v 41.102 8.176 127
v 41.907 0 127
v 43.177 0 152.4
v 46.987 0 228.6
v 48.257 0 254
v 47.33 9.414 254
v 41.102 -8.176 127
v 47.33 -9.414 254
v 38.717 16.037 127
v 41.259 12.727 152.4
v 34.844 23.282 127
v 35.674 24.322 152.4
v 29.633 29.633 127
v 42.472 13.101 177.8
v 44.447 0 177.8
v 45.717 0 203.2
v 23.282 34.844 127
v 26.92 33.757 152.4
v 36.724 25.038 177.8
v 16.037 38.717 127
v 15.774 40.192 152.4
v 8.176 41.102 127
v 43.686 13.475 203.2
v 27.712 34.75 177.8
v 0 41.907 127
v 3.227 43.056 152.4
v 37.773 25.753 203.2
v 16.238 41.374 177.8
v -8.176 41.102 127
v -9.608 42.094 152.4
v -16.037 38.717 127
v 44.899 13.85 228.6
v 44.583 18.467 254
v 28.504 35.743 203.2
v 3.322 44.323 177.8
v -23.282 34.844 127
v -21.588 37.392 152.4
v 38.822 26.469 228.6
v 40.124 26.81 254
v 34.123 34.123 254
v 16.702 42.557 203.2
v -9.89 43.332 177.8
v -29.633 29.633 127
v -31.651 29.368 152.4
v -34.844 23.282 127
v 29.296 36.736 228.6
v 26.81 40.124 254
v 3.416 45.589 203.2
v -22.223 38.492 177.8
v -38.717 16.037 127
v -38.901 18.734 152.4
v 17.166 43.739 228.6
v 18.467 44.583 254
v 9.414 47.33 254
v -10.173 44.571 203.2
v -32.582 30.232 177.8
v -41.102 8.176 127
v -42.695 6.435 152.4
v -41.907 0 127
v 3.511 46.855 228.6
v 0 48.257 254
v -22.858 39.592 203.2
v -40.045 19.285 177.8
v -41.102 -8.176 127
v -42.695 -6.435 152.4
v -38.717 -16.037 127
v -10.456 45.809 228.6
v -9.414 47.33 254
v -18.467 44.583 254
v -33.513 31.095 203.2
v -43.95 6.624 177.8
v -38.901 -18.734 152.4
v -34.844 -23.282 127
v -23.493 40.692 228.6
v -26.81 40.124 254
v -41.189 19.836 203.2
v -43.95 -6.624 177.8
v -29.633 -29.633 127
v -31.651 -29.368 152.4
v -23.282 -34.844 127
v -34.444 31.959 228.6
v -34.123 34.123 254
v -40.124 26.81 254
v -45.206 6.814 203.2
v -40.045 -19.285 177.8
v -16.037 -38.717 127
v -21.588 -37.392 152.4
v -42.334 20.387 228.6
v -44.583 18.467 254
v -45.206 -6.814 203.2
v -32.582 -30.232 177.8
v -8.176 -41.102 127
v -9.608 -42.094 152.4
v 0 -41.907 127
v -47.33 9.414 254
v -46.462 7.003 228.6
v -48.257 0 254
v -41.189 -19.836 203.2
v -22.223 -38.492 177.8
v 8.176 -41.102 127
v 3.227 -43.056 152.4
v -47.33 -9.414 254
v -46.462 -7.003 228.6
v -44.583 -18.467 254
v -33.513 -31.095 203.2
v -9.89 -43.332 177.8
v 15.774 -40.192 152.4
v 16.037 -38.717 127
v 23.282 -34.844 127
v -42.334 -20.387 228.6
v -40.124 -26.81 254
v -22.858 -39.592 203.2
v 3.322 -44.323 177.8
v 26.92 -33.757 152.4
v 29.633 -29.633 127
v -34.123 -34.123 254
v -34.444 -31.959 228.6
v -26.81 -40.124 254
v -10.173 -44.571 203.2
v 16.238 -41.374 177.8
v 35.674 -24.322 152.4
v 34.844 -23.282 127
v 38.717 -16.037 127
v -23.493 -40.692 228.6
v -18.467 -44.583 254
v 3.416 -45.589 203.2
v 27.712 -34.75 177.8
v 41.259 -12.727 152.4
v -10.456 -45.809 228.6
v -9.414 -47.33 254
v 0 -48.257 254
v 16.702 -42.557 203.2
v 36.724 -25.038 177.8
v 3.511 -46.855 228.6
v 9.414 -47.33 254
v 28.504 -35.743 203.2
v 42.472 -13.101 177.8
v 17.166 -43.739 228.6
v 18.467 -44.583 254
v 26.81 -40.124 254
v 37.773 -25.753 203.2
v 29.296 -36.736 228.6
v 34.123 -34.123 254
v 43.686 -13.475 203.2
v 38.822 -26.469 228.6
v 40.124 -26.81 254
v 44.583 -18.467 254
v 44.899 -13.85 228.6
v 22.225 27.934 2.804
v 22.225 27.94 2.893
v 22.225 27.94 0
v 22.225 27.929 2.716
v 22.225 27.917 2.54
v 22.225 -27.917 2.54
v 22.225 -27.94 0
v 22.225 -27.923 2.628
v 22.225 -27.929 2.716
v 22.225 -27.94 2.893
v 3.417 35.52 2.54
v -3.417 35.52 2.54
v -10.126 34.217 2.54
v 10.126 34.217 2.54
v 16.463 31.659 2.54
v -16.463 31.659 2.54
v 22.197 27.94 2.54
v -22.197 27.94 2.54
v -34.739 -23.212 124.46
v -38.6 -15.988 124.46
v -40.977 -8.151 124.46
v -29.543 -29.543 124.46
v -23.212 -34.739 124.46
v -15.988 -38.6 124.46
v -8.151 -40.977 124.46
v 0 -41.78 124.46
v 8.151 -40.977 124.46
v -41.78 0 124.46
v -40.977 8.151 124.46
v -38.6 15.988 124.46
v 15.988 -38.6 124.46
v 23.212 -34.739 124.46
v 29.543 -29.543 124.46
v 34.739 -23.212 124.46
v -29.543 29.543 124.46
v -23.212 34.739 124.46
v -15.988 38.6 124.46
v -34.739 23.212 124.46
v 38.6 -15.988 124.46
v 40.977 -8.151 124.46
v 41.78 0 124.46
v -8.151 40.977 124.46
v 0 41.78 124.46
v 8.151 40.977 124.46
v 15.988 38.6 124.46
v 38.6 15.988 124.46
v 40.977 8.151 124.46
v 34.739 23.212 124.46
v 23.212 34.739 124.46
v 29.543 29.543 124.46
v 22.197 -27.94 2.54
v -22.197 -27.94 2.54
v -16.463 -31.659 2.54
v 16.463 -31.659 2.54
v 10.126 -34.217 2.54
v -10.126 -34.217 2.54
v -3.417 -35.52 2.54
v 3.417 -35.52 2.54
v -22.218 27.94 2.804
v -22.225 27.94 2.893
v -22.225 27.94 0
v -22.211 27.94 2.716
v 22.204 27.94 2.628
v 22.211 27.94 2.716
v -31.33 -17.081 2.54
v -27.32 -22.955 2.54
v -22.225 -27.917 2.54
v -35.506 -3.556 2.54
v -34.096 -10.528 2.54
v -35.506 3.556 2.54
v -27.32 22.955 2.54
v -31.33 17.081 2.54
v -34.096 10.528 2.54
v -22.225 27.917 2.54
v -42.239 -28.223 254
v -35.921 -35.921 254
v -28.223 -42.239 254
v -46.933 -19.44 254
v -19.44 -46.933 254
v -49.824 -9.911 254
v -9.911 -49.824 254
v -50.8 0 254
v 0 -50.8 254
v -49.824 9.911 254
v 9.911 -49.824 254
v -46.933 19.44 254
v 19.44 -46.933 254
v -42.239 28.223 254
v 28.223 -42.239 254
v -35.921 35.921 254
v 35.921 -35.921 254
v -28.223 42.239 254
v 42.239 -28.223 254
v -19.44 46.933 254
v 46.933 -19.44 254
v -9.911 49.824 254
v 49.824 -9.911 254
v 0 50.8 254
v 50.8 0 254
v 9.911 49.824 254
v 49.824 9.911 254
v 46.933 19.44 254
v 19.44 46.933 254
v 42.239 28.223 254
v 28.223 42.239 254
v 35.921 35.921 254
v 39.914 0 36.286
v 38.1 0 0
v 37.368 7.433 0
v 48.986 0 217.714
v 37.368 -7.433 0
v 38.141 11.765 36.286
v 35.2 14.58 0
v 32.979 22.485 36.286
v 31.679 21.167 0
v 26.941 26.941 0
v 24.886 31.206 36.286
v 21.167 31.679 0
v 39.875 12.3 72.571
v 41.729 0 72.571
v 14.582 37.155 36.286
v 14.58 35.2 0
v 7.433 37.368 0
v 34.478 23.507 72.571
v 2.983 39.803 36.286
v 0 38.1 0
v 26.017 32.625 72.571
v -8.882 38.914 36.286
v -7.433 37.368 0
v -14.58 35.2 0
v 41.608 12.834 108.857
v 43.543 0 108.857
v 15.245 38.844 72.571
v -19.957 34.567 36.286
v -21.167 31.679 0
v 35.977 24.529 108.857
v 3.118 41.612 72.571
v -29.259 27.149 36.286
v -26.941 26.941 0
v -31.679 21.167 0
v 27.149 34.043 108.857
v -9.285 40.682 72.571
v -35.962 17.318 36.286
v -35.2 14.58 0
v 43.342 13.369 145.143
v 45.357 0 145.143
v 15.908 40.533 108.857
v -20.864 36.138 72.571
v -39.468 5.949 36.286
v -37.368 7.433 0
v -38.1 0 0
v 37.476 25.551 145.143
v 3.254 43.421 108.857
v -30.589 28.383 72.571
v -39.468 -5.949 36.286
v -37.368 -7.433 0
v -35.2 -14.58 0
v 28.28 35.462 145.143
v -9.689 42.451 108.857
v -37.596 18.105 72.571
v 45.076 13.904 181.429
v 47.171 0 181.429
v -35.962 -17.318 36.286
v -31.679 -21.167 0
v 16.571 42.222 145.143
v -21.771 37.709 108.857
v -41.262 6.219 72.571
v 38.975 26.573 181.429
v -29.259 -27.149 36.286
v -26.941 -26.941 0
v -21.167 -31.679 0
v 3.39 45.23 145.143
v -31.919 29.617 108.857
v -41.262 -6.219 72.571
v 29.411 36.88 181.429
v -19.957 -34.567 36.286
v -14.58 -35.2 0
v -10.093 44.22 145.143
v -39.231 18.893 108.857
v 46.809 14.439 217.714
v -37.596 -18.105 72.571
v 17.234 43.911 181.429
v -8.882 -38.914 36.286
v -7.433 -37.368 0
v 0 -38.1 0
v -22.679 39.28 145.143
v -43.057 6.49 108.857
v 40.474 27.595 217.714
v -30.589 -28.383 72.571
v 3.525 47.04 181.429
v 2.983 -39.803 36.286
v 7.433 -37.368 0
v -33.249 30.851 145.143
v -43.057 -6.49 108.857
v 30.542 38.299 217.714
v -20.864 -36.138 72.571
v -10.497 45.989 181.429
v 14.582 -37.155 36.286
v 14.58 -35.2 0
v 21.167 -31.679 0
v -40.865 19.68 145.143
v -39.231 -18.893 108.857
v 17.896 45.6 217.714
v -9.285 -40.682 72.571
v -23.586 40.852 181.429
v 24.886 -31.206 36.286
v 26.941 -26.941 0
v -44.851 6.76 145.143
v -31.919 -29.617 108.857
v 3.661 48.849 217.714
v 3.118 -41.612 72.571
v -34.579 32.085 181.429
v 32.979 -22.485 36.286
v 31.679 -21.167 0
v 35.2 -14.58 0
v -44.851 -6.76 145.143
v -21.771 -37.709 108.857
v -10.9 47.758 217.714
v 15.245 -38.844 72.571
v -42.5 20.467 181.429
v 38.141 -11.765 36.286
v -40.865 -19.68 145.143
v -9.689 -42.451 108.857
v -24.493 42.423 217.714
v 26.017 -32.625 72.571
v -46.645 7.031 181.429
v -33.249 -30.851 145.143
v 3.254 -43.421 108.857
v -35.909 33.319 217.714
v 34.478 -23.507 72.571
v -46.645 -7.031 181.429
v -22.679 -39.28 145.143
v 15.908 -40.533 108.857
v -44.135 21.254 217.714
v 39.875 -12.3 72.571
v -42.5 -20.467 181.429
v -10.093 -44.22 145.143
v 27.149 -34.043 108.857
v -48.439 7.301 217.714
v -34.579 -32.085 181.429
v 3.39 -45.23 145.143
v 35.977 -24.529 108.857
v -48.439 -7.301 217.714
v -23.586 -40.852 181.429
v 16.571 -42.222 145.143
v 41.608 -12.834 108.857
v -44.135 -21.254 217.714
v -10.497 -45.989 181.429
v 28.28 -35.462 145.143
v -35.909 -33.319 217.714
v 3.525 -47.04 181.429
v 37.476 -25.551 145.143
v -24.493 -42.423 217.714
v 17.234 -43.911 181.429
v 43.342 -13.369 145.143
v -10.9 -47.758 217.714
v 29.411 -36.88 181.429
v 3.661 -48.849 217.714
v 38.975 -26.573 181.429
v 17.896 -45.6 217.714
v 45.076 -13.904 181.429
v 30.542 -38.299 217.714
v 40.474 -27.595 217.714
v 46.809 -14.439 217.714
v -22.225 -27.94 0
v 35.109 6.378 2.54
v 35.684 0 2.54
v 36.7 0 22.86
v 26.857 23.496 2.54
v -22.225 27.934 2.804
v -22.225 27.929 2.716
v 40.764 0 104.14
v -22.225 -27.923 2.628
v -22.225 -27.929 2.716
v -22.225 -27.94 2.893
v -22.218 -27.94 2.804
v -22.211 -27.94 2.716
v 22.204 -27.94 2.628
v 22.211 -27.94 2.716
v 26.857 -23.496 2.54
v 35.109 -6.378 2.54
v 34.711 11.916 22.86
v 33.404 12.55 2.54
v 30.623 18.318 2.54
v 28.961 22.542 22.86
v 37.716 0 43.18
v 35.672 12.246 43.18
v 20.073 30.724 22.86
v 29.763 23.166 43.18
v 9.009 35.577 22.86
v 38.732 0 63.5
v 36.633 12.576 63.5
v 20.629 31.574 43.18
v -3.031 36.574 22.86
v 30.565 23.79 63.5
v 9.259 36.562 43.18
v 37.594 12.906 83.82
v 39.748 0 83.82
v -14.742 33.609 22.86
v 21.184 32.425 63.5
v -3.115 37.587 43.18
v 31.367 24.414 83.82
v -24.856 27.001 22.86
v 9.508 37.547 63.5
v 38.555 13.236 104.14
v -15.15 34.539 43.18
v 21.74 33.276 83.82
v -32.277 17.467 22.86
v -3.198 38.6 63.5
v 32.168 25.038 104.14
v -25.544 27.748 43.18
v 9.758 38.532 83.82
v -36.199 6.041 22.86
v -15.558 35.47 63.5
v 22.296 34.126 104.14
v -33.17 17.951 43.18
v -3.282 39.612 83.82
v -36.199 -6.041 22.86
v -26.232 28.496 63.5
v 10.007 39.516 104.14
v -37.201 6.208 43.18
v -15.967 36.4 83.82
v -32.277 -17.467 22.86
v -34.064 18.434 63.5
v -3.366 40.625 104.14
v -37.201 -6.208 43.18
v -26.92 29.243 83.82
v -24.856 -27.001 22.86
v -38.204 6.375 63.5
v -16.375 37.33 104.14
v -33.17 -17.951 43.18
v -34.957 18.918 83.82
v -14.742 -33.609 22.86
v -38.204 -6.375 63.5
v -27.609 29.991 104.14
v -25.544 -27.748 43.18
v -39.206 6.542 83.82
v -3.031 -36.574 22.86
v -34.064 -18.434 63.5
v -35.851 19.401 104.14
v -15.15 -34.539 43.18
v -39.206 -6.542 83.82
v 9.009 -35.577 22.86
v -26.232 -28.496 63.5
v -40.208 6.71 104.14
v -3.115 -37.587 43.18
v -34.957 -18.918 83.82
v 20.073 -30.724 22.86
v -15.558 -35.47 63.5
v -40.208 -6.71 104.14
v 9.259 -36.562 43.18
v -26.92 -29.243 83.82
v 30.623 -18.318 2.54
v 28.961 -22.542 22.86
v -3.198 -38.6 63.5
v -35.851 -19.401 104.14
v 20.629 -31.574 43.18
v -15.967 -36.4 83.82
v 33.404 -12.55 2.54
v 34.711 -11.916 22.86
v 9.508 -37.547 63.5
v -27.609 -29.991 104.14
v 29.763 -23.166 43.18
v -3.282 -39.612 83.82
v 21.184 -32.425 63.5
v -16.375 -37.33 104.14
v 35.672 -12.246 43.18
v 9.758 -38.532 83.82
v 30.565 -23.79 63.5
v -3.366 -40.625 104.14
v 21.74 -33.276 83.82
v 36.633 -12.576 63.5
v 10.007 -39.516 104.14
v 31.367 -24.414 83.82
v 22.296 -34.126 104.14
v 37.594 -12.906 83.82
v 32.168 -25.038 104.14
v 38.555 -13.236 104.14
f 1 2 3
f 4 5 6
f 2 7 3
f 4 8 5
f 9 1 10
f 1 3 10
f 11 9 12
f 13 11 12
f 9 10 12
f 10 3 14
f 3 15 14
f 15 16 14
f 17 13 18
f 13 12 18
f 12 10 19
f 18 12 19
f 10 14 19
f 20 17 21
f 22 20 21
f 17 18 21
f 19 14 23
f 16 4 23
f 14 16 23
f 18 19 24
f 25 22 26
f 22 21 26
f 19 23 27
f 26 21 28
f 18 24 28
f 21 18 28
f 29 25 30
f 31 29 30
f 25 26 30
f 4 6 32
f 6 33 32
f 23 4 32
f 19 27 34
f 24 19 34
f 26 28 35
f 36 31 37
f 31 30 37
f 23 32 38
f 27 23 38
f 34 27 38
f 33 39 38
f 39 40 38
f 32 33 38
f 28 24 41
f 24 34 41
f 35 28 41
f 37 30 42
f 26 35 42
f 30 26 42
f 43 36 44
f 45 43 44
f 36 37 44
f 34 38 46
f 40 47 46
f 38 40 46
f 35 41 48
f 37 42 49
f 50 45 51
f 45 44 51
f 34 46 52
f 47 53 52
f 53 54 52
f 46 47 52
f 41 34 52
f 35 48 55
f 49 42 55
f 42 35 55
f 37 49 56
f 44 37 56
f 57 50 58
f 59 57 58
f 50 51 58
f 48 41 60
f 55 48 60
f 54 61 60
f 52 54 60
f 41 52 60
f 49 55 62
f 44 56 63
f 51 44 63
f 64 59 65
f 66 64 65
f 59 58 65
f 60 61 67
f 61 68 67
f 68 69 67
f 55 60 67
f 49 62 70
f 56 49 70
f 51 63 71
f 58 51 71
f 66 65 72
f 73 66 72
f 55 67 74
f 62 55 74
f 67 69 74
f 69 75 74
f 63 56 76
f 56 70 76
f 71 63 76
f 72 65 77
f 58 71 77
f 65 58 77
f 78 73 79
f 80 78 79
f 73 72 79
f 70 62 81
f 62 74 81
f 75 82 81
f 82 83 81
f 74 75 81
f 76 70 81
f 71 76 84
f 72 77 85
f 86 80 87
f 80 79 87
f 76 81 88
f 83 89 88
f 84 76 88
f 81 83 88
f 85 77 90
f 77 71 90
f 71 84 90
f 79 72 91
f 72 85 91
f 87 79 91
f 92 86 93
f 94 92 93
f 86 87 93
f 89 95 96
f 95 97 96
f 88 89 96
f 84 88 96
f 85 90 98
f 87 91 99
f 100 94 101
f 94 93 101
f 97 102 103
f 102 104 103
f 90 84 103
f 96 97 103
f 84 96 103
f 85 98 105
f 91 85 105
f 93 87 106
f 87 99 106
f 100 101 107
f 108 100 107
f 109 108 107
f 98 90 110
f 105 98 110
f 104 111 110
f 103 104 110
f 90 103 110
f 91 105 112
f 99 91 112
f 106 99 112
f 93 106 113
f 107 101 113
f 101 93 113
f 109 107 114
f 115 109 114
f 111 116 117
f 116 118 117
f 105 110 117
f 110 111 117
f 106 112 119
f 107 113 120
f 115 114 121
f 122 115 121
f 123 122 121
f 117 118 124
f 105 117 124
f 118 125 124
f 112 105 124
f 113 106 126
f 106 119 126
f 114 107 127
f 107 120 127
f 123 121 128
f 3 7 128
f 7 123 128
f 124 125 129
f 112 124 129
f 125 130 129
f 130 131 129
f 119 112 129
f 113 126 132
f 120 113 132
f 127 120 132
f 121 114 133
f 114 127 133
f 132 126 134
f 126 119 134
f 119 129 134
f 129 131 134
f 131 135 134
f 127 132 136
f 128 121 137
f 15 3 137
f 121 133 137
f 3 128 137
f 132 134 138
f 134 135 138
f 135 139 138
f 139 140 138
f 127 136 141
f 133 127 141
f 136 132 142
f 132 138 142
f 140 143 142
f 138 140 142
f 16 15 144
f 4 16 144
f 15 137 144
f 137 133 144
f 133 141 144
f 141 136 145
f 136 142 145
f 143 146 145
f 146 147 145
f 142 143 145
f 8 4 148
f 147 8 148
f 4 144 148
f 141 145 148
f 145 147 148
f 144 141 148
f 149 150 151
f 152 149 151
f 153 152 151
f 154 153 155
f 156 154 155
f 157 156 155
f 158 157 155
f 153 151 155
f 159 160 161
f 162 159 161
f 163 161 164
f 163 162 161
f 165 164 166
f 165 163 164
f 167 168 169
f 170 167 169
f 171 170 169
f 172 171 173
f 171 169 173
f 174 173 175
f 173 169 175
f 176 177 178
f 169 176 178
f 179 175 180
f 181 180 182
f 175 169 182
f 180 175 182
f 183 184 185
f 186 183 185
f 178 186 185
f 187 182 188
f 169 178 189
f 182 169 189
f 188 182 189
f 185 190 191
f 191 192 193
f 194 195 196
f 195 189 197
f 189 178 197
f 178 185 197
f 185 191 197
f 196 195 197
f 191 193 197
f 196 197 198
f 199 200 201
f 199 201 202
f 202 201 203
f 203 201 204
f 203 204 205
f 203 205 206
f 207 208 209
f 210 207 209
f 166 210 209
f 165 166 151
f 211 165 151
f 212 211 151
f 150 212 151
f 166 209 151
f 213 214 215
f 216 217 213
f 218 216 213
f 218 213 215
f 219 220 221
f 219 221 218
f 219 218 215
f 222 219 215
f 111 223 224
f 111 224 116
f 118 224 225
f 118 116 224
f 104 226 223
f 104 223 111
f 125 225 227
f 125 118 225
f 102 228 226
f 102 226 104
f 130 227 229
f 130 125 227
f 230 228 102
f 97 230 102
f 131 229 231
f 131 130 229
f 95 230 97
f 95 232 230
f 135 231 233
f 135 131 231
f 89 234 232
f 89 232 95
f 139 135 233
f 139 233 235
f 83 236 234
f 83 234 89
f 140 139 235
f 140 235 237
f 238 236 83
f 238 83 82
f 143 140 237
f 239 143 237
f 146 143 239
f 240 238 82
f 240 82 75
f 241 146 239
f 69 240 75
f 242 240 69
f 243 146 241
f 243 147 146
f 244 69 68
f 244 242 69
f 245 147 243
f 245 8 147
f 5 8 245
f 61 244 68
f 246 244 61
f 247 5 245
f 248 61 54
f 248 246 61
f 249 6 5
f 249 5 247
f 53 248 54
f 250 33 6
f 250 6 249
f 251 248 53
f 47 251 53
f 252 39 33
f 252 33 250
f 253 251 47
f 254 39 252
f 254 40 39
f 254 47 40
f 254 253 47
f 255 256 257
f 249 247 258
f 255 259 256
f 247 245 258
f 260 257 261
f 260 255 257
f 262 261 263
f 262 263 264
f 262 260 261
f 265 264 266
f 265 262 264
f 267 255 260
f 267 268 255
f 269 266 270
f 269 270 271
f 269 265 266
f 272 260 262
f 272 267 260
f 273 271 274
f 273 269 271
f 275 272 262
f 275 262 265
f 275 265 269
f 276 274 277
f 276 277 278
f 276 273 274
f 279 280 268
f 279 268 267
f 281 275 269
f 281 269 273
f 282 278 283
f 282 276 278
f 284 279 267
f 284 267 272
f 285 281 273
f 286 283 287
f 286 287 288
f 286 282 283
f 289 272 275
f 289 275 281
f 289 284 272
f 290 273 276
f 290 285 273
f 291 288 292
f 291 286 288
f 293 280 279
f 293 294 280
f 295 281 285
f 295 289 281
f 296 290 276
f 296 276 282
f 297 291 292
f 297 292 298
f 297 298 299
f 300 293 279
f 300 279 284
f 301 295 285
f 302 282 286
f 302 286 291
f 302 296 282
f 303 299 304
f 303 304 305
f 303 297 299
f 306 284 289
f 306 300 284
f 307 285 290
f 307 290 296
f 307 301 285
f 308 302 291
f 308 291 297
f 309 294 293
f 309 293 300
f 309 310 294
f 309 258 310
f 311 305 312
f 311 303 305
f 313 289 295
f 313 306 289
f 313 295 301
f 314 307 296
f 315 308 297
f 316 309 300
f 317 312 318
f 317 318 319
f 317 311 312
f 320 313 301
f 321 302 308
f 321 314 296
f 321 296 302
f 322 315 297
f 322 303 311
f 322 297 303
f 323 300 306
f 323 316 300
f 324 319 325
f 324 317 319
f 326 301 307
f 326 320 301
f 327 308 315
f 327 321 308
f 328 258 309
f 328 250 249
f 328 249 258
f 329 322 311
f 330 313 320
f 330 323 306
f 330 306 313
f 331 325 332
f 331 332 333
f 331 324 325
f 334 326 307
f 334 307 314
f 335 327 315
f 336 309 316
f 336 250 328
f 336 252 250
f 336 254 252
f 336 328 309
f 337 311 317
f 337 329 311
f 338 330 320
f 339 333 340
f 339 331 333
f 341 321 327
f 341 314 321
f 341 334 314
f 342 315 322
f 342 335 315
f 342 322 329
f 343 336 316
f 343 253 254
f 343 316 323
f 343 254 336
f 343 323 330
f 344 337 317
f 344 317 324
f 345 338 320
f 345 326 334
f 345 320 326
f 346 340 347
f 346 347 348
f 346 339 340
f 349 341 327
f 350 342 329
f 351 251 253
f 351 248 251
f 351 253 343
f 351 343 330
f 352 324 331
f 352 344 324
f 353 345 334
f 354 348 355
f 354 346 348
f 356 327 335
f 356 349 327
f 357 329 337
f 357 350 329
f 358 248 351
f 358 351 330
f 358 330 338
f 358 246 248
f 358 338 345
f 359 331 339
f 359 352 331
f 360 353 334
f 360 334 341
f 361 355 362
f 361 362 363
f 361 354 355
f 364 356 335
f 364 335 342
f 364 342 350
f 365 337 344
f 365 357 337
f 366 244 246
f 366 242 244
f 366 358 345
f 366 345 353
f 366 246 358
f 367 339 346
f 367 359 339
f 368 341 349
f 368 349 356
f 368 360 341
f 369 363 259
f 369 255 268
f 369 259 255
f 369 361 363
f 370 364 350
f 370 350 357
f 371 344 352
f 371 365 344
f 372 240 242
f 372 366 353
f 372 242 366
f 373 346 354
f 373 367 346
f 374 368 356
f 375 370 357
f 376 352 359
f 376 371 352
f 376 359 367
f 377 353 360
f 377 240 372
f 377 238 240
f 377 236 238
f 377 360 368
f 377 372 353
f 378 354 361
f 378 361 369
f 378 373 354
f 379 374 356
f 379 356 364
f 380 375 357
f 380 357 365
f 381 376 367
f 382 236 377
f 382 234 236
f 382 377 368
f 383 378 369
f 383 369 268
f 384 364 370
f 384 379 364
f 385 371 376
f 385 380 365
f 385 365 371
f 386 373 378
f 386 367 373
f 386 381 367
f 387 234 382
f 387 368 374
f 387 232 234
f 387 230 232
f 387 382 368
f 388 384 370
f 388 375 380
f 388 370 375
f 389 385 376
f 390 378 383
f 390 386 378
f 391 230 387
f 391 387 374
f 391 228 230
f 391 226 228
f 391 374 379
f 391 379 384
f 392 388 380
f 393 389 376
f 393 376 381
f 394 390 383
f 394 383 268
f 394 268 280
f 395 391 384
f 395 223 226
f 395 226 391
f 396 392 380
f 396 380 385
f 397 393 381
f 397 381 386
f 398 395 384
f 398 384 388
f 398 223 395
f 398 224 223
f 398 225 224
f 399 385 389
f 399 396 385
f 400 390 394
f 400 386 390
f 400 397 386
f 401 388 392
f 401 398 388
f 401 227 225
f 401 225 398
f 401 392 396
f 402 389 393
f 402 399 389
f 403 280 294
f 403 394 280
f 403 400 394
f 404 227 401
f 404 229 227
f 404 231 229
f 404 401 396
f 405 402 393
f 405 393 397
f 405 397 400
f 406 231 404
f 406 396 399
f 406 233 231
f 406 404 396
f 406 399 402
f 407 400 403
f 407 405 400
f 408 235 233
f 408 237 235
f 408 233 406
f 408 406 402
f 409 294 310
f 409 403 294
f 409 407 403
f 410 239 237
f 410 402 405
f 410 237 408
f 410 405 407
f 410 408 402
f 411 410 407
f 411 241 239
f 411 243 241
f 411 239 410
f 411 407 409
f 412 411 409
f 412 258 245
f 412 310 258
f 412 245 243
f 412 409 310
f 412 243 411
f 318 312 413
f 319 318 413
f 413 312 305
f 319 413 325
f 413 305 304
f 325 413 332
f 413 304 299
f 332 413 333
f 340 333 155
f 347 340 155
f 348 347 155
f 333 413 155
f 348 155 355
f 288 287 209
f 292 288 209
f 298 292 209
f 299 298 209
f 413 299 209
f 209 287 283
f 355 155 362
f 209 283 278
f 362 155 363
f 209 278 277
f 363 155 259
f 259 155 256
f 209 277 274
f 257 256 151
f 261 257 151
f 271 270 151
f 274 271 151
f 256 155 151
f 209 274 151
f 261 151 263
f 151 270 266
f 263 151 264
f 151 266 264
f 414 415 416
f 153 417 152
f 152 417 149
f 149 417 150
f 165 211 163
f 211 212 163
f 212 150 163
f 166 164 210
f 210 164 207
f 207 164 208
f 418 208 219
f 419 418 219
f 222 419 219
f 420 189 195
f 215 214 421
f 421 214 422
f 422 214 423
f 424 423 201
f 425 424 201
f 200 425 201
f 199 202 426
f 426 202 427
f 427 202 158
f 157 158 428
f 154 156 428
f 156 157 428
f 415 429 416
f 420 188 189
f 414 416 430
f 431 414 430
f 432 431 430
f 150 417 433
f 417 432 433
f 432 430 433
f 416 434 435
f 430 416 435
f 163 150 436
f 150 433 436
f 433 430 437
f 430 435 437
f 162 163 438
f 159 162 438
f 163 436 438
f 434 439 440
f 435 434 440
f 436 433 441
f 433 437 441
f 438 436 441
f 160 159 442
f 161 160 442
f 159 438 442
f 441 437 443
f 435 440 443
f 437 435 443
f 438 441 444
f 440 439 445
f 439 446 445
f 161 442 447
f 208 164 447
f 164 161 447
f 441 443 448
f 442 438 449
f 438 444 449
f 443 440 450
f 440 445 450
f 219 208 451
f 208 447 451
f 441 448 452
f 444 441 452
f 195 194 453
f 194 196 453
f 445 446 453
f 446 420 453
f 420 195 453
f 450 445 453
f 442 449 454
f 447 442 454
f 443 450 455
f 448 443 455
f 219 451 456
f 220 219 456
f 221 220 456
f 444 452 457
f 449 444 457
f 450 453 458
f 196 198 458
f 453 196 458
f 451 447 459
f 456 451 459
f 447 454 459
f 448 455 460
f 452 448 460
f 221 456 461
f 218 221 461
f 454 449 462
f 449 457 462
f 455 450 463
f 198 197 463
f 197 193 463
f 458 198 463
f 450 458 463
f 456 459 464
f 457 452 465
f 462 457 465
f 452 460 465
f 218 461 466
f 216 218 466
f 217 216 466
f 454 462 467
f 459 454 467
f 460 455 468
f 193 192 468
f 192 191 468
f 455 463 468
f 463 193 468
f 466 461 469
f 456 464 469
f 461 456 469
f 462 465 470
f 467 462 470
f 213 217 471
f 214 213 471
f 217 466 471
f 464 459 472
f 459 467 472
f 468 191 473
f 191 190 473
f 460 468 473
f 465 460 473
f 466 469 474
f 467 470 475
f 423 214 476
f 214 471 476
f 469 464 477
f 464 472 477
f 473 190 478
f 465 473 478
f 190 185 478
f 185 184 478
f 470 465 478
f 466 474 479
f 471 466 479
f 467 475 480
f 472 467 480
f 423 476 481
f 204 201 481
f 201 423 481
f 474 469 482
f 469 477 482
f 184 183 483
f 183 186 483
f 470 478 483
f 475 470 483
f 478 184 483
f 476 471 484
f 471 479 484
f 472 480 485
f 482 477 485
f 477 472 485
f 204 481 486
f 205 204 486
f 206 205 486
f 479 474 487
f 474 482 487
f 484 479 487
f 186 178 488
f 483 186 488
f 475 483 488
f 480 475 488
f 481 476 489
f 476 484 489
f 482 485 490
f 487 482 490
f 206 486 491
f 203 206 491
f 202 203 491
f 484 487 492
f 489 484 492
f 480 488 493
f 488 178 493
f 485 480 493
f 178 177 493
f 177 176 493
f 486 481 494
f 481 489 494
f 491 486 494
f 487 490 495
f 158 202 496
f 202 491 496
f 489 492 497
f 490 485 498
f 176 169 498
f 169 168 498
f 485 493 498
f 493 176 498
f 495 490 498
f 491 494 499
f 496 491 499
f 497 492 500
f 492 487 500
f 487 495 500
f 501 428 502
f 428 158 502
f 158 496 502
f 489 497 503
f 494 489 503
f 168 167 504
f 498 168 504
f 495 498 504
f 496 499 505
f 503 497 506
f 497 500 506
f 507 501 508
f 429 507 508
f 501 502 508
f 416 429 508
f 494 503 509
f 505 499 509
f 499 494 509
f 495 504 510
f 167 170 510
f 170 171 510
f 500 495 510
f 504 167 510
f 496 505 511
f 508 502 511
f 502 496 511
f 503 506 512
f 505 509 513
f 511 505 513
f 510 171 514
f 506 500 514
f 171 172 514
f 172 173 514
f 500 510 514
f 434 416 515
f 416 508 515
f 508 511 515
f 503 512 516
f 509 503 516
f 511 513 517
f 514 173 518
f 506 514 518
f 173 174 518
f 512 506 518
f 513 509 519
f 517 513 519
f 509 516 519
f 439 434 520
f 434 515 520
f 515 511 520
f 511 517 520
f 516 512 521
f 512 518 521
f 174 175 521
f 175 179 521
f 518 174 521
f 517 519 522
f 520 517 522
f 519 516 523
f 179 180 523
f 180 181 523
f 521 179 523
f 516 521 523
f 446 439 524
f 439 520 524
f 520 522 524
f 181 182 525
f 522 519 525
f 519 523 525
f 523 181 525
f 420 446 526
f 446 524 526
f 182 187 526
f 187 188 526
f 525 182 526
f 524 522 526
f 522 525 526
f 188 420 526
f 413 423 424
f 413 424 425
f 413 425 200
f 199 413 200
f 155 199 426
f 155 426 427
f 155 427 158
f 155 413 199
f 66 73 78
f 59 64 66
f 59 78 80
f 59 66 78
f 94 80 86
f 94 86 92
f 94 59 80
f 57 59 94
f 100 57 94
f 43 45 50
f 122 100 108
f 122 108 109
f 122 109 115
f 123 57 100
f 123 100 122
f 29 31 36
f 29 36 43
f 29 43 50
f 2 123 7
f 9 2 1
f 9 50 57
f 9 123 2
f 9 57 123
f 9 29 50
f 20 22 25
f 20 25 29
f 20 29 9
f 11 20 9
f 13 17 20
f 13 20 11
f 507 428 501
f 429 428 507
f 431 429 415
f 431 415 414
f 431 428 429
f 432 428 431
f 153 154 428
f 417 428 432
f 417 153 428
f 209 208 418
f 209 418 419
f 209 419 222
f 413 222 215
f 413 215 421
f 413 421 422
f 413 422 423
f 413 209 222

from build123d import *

# Parameters (mm, degrees)
F0_R     = 38.1
F2_R     = 50.8
F4_T     = -2.54
F5_W     = 44.45
F5_H     = 55.88
F6_DEPTH = 25.4
F8_R     = 41.91
F9_DEPTH = 2.54


with BuildPart() as f3:
    # F0 (on Top) → F3 section 0
    with BuildSketch(Plane.XY):
        Circle(F0_R)
    # F2 (on offset) → F3 section 1
    with BuildSketch(Plane.XY.offset(254)):
        Circle(F2_R)
    loft()

    # F4
    f4_openings = [f3.faces().sort_by_distance(p)[0] for p in [
        (0, 0, 254),
    ]]
    offset(amount=F4_T, openings=f4_openings, kind=Kind.INTERSECTION)

    # F5 (on face) → F6 (cut)
    with BuildSketch(Plane(origin=(0, 0, 0), x_dir=(1, 0, 0), z_dir=(0, 0, -1))):
        Rectangle(F5_W, F5_H)
    extrude(amount=-F6_DEPTH, mode=Mode.SUBTRACT)

    # F8 (on offset) → F9 (join)
    with BuildSketch(Plane.XY.offset(127)):
        Circle(F8_R)
    extrude(amount=-F9_DEPTH)


solid = f3.part
